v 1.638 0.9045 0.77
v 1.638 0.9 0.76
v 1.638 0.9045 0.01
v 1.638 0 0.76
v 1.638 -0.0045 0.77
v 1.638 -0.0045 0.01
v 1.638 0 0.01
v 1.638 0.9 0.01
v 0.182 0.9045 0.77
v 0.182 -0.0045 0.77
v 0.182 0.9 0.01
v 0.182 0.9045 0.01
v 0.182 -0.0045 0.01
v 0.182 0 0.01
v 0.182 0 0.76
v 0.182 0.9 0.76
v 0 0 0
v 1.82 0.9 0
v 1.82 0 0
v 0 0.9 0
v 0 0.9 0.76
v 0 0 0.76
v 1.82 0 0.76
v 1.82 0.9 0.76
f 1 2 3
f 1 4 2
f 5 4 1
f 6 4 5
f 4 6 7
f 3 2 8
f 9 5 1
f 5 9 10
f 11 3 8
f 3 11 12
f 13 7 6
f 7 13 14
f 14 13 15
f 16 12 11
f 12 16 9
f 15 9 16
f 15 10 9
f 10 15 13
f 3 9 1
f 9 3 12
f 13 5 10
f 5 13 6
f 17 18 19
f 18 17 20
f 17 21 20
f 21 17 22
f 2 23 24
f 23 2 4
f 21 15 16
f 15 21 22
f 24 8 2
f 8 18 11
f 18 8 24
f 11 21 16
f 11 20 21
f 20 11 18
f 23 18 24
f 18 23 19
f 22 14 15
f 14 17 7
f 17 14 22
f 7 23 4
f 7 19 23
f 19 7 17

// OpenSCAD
/**
 * Module: Placeholder for SMD cermaic capacitor
 *
 * Author: Karim Aziiev <karim.aziiev@gmail.com>
 * License: GPL-3.0-or-later
 */

include <../../colors.scad>
include <../presets.scad>

use <../../lib/functions.scad>
use <../../lib/plist.scad>
use <smd_resistor.scad>

module ceramic_capactior(plist=ceramic_capacitor_plist, center=false) {
  assert(plist_is(plist) && len(plist) > 0, "Supply a hardware specification");
  size = plist_get("placeholder_size", plist, [3.4, 1.4, 1.2]);
  x = size[0];
  y = size[1];

  border_color = plist_get("border_color", plist, "white");

  body_h = plist_get("body_h", plist, 0.01);
  border_w = plist_get("border_w", plist, undef);
  border_p = plist_get("border_p", plist, undef);
  body_color = plist_get("body_color", plist, metallic_gold_2);
  fillet_factor = plist_get("fillet_factor", plist, 0.0);
  pad_color = plist_get("pad_color", plist, "lightyellow");
  pad_factor_x = plist_get("pad_factor_x", plist, x > y ? 0.7 : 1.01);
  pad_factor_y = plist_get("pad_factor_y", plist, x < y ? 0.7 : 1.01);
  marking = plist_get("marking", plist, undef);
  mark_color = plist_get("mark_color", plist, undef);
  mark_size = plist_get("mark_size", plist, undef);
  mark_font = plist_get("mark_font", plist, "Liberation Sans:style=Bold");
  mark_spacing = plist_get("mark_spacing", plist, 0.8);
  use_inner_round = plist_get("use_inner_round", plist, false);

  smd_resistor(size=size,
               center=center,
               border_color=border_color,
               body_h=body_h,
               border_w=border_w,
               border_p=border_p,
               body_color=body_color,
               fillet_factor=fillet_factor,
               pad_color=pad_color,
               pad_factor_x=pad_factor_x,
               pad_factor_y=pad_factor_y,
               marking=marking,
               mark_color=mark_color,
               mark_size=mark_size,
               mark_font=mark_font,
               mark_spacing=mark_spacing,
               use_inner_round=use_inner_round);
}

ceramic_capactior(["placeholder_size", [1.82, 0.9, 0.76],
                   "pad_factor_x", 0.8]);
